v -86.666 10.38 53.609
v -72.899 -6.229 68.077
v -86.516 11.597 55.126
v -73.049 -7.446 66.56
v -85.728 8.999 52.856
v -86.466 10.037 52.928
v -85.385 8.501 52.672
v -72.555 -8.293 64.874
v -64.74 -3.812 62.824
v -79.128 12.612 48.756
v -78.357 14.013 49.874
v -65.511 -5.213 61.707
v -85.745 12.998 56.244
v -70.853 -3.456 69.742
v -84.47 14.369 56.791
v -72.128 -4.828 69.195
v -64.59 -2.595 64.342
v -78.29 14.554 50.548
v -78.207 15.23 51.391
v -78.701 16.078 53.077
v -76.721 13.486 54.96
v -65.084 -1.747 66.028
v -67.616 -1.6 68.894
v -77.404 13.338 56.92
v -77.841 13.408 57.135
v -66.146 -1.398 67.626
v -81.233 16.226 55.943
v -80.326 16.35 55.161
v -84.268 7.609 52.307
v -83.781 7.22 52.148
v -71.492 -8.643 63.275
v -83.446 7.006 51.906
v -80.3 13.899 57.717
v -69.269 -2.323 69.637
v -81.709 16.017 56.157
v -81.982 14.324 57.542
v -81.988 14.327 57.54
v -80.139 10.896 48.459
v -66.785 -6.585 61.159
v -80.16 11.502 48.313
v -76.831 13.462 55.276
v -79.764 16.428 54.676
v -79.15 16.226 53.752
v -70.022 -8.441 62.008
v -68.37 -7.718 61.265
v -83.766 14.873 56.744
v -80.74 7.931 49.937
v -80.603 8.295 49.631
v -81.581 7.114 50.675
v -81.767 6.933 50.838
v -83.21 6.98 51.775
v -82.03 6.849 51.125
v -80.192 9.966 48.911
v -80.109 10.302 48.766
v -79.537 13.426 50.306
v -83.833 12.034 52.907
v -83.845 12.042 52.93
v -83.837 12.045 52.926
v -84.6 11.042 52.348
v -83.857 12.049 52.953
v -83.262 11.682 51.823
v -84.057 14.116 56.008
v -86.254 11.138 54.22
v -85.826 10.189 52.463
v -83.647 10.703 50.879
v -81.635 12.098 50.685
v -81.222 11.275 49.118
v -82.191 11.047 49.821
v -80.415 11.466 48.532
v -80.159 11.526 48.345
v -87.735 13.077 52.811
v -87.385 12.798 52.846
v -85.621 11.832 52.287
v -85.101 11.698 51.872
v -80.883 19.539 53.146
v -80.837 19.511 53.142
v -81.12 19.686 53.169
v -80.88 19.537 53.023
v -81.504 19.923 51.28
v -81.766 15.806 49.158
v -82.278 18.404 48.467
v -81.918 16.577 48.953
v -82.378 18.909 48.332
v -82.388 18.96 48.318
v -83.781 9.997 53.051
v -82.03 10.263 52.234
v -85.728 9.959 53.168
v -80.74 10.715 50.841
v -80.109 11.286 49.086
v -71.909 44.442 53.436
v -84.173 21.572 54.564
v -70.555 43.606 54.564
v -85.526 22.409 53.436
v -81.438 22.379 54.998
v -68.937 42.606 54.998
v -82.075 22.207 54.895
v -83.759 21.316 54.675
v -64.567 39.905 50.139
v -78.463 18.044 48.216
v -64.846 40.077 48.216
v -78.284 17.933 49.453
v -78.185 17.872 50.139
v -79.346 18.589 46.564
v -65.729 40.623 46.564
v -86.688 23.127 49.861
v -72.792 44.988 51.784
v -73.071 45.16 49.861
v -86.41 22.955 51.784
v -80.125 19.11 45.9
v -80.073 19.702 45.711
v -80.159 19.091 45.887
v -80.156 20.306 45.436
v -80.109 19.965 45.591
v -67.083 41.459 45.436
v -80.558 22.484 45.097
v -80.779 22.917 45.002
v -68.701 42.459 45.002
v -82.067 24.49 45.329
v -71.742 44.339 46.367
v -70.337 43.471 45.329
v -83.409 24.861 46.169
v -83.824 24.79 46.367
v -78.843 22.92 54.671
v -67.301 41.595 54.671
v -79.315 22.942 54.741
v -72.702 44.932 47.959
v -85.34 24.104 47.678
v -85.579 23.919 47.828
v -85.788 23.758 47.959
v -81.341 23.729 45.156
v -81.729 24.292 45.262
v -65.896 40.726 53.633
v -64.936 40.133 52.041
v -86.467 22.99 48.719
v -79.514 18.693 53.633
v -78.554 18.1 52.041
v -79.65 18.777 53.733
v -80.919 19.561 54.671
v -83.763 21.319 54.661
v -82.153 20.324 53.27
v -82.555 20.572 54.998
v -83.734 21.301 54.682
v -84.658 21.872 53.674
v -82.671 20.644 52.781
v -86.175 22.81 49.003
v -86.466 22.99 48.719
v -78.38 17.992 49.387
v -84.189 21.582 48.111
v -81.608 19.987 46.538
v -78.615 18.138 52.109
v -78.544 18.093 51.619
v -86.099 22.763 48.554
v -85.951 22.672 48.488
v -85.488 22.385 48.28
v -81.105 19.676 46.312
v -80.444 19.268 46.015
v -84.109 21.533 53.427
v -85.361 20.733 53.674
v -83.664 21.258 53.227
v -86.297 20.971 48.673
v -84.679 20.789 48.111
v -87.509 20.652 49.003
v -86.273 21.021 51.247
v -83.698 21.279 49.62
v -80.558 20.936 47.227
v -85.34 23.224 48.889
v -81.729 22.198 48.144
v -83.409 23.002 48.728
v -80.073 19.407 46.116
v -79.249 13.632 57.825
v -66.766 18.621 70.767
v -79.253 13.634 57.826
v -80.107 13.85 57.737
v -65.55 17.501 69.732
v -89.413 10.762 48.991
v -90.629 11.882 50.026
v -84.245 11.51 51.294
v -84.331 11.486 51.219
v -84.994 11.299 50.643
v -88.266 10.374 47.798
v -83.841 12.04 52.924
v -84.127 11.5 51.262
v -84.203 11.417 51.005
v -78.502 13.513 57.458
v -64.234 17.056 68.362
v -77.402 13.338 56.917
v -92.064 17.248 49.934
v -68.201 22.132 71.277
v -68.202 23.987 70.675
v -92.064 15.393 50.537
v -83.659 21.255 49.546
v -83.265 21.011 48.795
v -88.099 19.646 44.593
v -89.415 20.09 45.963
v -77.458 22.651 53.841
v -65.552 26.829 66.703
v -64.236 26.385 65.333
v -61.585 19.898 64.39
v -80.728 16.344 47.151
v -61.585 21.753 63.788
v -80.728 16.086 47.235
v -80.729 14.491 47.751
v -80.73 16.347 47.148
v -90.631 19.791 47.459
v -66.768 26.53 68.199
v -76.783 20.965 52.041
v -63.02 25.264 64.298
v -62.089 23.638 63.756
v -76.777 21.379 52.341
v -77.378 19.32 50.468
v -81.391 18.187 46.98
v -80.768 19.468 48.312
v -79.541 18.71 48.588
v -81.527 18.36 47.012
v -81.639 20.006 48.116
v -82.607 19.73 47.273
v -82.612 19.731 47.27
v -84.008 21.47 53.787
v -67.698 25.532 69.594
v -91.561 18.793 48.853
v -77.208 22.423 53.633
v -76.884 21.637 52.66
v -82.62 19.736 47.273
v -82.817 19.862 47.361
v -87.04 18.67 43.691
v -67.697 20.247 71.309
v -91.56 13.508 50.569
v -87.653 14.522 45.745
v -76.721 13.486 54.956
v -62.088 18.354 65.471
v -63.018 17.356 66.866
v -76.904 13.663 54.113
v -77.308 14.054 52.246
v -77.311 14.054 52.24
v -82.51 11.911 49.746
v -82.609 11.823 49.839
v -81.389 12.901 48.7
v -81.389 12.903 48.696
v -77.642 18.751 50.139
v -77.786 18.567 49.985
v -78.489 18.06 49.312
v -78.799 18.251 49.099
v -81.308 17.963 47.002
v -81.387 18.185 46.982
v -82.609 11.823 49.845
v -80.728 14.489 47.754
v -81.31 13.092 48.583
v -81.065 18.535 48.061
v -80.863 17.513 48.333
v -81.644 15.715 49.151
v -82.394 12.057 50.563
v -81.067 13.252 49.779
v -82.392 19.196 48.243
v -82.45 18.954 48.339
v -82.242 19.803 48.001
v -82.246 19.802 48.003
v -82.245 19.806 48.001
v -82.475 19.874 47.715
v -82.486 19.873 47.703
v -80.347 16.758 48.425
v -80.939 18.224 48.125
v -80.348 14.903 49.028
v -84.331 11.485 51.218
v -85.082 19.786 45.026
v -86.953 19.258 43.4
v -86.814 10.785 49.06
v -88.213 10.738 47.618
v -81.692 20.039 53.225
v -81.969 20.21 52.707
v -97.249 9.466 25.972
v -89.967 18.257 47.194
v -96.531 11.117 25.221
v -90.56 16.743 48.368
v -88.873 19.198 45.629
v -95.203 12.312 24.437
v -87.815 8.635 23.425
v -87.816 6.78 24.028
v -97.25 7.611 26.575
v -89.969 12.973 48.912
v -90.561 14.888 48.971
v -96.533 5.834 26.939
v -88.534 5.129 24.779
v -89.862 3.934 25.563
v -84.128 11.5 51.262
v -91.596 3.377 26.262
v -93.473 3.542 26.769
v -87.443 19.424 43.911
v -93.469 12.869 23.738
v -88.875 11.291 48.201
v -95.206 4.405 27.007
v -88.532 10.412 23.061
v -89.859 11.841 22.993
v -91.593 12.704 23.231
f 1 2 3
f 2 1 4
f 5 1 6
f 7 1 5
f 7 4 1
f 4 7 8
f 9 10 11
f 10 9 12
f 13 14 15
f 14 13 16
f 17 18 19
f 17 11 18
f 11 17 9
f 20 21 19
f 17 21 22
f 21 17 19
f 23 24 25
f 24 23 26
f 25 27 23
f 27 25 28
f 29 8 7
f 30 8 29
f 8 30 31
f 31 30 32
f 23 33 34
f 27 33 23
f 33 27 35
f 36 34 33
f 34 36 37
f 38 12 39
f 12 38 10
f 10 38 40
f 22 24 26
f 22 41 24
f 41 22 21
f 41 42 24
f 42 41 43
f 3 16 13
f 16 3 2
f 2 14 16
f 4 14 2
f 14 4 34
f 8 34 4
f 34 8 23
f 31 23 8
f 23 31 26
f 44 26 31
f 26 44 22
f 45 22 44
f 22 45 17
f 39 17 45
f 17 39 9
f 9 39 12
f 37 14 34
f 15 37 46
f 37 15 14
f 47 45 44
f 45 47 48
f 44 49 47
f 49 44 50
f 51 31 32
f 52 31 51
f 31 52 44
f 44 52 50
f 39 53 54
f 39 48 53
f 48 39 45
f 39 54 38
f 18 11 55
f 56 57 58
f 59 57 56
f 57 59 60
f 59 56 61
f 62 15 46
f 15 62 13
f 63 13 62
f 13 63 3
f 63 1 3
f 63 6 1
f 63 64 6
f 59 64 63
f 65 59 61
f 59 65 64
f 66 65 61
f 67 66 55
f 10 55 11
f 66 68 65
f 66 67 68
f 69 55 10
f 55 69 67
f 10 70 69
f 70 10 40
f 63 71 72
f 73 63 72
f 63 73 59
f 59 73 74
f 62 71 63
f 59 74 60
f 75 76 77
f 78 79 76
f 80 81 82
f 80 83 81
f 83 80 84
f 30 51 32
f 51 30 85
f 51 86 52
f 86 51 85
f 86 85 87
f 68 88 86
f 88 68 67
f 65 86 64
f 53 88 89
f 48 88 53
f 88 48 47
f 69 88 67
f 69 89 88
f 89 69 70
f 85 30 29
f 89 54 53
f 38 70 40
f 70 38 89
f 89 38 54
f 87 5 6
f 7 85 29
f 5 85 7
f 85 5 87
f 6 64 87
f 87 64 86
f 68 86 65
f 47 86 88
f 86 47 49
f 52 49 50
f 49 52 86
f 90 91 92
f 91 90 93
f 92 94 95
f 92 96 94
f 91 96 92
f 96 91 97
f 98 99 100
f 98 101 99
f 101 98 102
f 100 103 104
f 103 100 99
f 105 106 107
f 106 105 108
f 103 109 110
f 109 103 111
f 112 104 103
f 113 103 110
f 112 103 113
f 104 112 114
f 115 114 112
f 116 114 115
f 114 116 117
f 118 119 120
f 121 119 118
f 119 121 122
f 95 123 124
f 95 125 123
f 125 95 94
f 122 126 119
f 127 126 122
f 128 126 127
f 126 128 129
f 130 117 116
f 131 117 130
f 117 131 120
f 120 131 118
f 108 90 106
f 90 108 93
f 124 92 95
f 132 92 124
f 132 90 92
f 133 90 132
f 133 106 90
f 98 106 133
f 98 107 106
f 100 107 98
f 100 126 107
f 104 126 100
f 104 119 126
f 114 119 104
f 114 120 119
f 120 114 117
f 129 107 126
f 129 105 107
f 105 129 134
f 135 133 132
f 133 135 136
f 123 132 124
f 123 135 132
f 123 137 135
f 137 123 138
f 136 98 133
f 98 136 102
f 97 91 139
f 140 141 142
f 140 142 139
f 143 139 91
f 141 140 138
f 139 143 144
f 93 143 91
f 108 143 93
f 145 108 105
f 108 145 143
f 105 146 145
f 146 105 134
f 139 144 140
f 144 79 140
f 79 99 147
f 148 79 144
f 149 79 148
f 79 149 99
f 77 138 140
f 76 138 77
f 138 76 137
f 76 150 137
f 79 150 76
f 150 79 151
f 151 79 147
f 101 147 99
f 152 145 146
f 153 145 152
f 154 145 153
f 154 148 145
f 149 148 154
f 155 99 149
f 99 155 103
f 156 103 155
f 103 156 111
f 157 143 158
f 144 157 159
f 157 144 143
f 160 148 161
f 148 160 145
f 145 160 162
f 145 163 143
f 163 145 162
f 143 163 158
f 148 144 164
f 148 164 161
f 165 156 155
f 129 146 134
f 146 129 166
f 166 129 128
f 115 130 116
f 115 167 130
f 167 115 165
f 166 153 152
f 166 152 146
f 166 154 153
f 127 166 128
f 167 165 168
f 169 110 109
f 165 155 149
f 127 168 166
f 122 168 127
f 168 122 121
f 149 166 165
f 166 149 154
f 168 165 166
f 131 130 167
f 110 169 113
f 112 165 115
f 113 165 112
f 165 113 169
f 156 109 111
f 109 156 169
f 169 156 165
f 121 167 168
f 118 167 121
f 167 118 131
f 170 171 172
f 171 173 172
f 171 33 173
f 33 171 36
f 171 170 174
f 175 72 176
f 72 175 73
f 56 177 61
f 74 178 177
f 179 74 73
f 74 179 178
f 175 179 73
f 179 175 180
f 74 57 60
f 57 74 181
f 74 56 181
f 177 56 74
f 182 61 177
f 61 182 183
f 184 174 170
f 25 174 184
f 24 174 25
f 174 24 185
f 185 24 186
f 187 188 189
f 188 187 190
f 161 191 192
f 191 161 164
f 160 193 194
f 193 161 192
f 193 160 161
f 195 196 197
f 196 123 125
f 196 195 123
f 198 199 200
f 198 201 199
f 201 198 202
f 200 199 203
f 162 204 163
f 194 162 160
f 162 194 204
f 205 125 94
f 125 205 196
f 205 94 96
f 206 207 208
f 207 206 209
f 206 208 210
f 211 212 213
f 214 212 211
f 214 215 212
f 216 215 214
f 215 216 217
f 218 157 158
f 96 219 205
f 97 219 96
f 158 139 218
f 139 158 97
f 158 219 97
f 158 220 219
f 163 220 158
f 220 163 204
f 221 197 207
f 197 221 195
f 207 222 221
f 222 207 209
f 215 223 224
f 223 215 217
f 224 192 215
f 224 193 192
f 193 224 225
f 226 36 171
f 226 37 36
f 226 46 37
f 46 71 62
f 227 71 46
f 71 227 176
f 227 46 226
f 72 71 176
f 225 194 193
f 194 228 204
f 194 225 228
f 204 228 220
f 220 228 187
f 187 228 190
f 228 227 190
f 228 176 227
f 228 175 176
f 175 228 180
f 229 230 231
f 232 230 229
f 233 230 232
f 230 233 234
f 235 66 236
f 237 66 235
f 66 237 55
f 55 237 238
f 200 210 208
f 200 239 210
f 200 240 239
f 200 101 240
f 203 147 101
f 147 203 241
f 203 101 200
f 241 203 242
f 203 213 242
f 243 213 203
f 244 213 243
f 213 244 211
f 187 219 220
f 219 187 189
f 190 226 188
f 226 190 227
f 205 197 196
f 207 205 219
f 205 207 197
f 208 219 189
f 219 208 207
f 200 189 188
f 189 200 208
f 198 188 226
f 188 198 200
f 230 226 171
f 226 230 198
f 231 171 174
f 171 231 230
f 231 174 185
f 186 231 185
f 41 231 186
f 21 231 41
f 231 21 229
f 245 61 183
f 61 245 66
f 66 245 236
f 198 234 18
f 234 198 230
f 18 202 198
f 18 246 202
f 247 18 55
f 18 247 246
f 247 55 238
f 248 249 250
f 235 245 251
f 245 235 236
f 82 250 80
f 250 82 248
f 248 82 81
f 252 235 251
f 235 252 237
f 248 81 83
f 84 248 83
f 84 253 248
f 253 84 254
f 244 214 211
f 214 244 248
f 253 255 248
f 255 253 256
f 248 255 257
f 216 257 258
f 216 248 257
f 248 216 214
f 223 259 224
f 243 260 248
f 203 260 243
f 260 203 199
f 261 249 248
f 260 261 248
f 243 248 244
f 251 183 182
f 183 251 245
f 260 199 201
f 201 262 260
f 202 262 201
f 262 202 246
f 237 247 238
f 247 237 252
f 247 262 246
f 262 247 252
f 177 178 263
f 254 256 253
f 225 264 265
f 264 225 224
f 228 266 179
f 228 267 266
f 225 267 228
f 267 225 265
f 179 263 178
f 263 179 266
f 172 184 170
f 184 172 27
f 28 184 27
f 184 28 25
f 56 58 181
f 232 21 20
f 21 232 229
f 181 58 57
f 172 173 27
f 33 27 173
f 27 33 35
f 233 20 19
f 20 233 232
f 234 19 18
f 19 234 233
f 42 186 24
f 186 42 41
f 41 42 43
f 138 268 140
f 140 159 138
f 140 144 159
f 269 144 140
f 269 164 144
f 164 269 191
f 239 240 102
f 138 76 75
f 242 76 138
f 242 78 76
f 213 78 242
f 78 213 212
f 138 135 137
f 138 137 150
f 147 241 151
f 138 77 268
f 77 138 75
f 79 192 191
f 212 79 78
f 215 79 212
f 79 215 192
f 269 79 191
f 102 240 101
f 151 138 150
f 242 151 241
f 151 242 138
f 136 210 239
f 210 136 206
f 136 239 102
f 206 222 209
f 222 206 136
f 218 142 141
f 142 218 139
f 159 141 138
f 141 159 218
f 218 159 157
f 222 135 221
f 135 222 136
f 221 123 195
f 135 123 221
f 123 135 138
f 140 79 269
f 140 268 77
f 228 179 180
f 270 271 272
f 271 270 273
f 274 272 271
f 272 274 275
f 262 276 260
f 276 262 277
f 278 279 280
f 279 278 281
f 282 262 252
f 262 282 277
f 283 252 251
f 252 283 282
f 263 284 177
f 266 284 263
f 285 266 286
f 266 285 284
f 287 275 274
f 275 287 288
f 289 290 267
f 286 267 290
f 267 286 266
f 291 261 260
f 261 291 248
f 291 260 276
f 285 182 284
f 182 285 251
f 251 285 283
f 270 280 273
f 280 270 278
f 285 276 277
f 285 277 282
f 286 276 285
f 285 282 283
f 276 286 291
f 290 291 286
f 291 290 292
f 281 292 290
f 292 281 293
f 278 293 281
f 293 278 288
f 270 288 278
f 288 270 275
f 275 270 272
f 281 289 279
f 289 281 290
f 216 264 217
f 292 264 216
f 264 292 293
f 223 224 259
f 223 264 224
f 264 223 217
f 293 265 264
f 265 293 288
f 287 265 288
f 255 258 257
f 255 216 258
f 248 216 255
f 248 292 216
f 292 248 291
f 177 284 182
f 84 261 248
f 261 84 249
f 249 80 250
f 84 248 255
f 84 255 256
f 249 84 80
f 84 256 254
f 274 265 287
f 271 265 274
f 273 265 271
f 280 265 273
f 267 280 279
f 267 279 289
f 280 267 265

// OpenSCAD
// file: local.scad
/*
Copyright (c) 2013 Johannes Reinhardt <jreinhardt@ist-dein-freund.de>

Permission is hereby granted, free of charge, to any person obtaining a copy
of this software and associated documentation files (the "Software"), to deal
in the Software without restriction, including without limitation the rights
to use, copy, modify, merge, publish, distribute, sublicense, and/or sell
copies of the Software, and to permit persons to whom the Software is
furnished to do so, subject to the following conditions:

The above copyright notice and this permission notice shall be included in
all copies or substantial portions of the Software.

THE SOFTWARE IS PROVIDED "AS IS", WITHOUT WARRANTY OF ANY KIND, EXPRESS OR
IMPLIED, INCLUDING BUT NOT LIMITED TO THE WARRANTIES OF MERCHANTABILITY,
FITNESS FOR A PARTICULAR PURPOSE AND NONINFRINGEMENT. IN NO EVENT SHALL THE
AUTHORS OR COPYRIGHT HOLDERS BE LIABLE FOR ANY CLAIM, DAMAGES OR OTHER
LIABILITY, WHETHER IN AN ACTION OF CONTRACT, TORT OR OTHERWISE, ARISING FROM,
OUT OF OR IN CONNECTION WITH THE SOFTWARE OR THE USE OR OTHER DEALINGS IN
THE SOFTWARE.
*/

/*
local.scad local coordinate systems for OpenSCAD

for more information, see https://github.com/jreinhardt/local-scad
*/

//a few utility functions
function norm(a) = sqrt(a*a);
function unit_vector(v) = v/norm(v);
function clamp(v,lower_bound,upper_bound) = min(max(v,lower_bound),upper_bound);
function cross_product(a,b) = [
	a[1]*b[2]-a[2]*b[1],
	a[2]*b[0]-a[0]*b[2],
	a[0]*b[1]-a[1]*b[0]
];

//works for both numbers and vectors
function almost_equal(number, ref, tol) = sqrt((number-ref)*(number-ref)) < tol;

function _rotation_angle(a,b) = (a*b > 0) ? 
	asin(clamp(norm(cross_product(b,a))/norm(a)/norm(b),-1,1)) :
	180 - asin(clamp(norm(cross_product(b,a))/norm(a)/norm(b),-1,1));

//The (non-unit) rotation axis and angle around which a has to be rotated to be colinear to b
function calculate_rotation_axis(a,b) =
	//if the two vectors are not colinear find a rotation axis using the cross product
	(norm(cross_product(b,a)) != 0) ? [unit_vector(cross_product(b,a)),_rotation_angle(a,b)] :
	//if they are colinear and do not lie in the yz plane, choose the rotation axis from the yz plane
	(a*[1,0,0] < 0) ? [unit_vector([0,-a[1],+a[0]]),acos(clamp(a*b/norm(a)/norm(b),-1,1))] :
	(a*[1,0,0] > 0) ? [unit_vector([0,+a[1],-a[0]]),acos(clamp(a*b/norm(a)/norm(b),-1,1))] :
	//otherwise use the x axis
	[[1,0,0],acos(clamp(a*b/norm(a)/norm(b),-1,1))];

function calculate_axes(x,y) = [unit_vector(x),unit_vector(y), unit_vector(cross_product(x,y))];

function new_cs(origin=[0,0,0],axes=[[1,0,0],[0,1,0],[0,0,1]]) = (len(axes) == 2) ?
	[origin,calculate_axes(axes[0],axes[1])] :
	is_orthonormal([origin,axes]) ?
		[origin,axes] :
		"Error: Axes are not orthonormal";

function is_orthonormal(cs,tol=1e-3) =
	(almost_equal(norm(cs[1][0]),1,tol)) &&
	(almost_equal(norm(cs[1][1]),1,tol)) &&
	(almost_equal(norm(cs[1][2]),1,tol)) &&
	(almost_equal(cross_product(cs[1][0],cs[1][1]),cs[1][2],tol)) &&
	(almost_equal(cross_product(cs[1][1],cs[1][2]),cs[1][0],tol)) &&
	(almost_equal(cross_product(cs[1][2],cs[1][0]),cs[1][1],tol));

function unit_matrix3() = [
[1,0,0],
[0,1,0],
[0,0,1]];

function tensor_product_matrix3(u,v) = [
[u[0]*v[0], u[0]*v[1], u[0]*v[2]],
[u[1]*v[0], u[1]*v[1], u[1]*v[2]],
[u[2]*v[0], u[2]*v[1], u[2]*v[2]]];

function cross_product_matrix3(v) = [
[   0 , -v[2], +v[1]],
[+v[2],    0 , -v[0]],
[-v[1],  v[0],    0 ]];

function rotation_matrix3(n,angle) =
	cos(angle)*unit_matrix3() +
	sin(angle)*cross_product_matrix3(n) +
	(1-cos(angle))*tensor_product_matrix3(n,n);

//the modules are used directly by the user
module show_cs(cs){
	origin = cs[0];
	axes = cs[1];
	x_rot = calculate_rotation_axis(axes[0],[0,0,1]);
	y_rot = calculate_rotation_axis(axes[1],[0,0,1]);
	z_rot = calculate_rotation_axis(axes[2],[0,0,1]);
	translate(origin){
		color("Gray") sphere(0.2);
		rotate(x_rot[1],x_rot[0]) color("Red") cylinder(r=0.1,h=100*norm(axes[0]));
		rotate(y_rot[1],y_rot[0]) color("Green") cylinder(r=0.1,h=100*norm(axes[1]));
		rotate(z_rot[1],z_rot[0]) color("Blue") cylinder(r=0.1,h=100*norm(axes[2]));
	}
}

module translate_local(cs,v=[0,0,0]){
	origin = cs[0];
	axes = cs[1];
	x_rot = calculate_rotation_axis(axes[0],[1,0,0]);
	y_rot = calculate_rotation_axis(axes[1],
		rotation_matrix3(x_rot[0],x_rot[1])*[0,1,0]);
	translate(origin+v*axes){
		//align y axes
		rotate(y_rot[1],y_rot[0]){
			//align x axes
			rotate(x_rot[1],x_rot[0]){
				child(0);
			}
		}
	}
}

module in_cs(cs){
	origin = cs[0];
	axes = cs[1];
	x_rot = calculate_rotation_axis(axes[0],[1,0,0]);
	y_rot = calculate_rotation_axis(axes[1],
		rotation_matrix3(x_rot[0],x_rot[1])*[0,1,0]);
	translate(origin){
		//align y axes
		rotate(y_rot[1],y_rot[0]){
			//align x axes
			rotate(x_rot[1],x_rot[0]){
				child(0);
			}
		}
	}
}

module back_to_absolute(cs){
	origin = cs[0];
	axes = cs[1];
	x_rot = calculate_rotation_axis(axes[0],[1,0,0]);
	y_rot = calculate_rotation_axis(axes[1],
		rotation_matrix3(x_rot[0],x_rot[1])*[0,1,0]);
       

		//align y axes
             rotate(x_rot[1], -x_rot[0]){
             rotate(y_rot[1],-y_rot[0]){
                  //align x axes
                  	translate(-origin){
				child(0);
			}
		}
	}
}

module align(cs, cs_dst, displacement=[0,0,0]){
	x_rot = calculate_rotation_axis(cs[1][0],cs_dst[1][0]);
	y_rot = _rotation_angle(cs[1][1],
		rotation_matrix3(x_rot[0],x_rot[1])*cs_dst[1][1]);
	translate(cs_dst[0]+displacement*cs_dst[1])
		//align x axes
		rotate(-x_rot[1],x_rot[0])
				//align y axes
				rotate(-y_rot,cs[1][0])
				translate(-cs[0])
					child(0);
}
// file: data.scad
points2 = [
     [44.721359, -27.639320, 85.065079],
     [-44.721359, 27.639320, 85.065079],
     [-44.721359, 27.639320, -85.065079],
     [44.721359, -27.639320, -85.065079],
     [-44.721359, -72.360680, 52.573109],
     [44.721359, 72.360680, 52.573109],
     [44.721359, 72.360680, -52.573109],
     [-44.721359, -72.360680, -52.573109],
     [44.721359, -89.442719, 0.000000],
     [100.000000, 0.000000, 0.000000],
     [-44.721359, 89.442719, 0.000000],
     [-100.000000, 0.000000, 0.000000],
     [0.000000, -95.105652, -30.901697],
     [0.000000, -95.105652, 30.901697],
     [-52.573109, -85.065086, 0.000000],
     [0.000000, -58.778526, -80.901695],
     [52.573109, -68.819092, -49.999996],
     [52.573109, -68.819092, 49.999996],
     [0.000000, -58.778526, 80.901695],
     [85.065086, -52.573109, 0.000000],
     [85.065086, -16.245981, 49.999996],
     [85.065086, -16.245985, -49.999996],
     [85.065086, 42.532543, 30.901697],
     [52.573109, 26.286554, 80.901695],
     [85.065086, 42.532543, -30.901697],
     [52.573109, 85.065086, 0.000000],
     [52.573109, 26.286558, -80.901695],
     [0.000000, 0.000000, -99.999992],
     [-52.573109, -26.286554, -80.901695],
     [0.000000, 58.778526, -80.901695],
     [0.000000, 0.000000, 99.999992],
     [-52.573109, -26.286558, 80.901695],
     [0.000000, 58.778526, 80.901695],
     [-85.065086, -42.532543, 30.901697],
     [-85.065086, -42.532543, -30.901697],
     [-85.065086, 16.245983, -49.999996],
     [-85.065086, 52.573109, 0.000000],
     [-52.573109, 68.819099, -49.999996],
     [-85.065086, 16.245985, 49.999996],
     [-52.573116, 68.819092, 49.999996],
     [0.000000, 95.105652, -30.901697],
     [0.000000, 95.105652, 30.901697]];

triangles2 = [
          [34, 11, 33],
          [35, 11, 34],
          [36, 11, 35] ,
          [36, 38, 11],
         [33, 11, 38],
          [14, 33, 4],
          [14, 34, 33],
          [7, 34, 14],
          [28, 34, 7],
          [28, 35, 34],
          [2, 35, 28],
          [37, 35, 2],
          [37, 36, 35],
          [10, 36, 37],
          [39, 1, 38],
          [36, 39, 38], 
          [10, 39, 36],
          [31, 38, 1],
          [31, 33, 38],
          [4, 33, 31],
          [14, 12, 7],
          [14, 13, 12],
          [4, 13, 14],
          [15, 7, 12],
          [18, 13, 4],
          [28, 27, 2],
          [28, 15, 27],
          [7, 15, 28],
          [2, 27, 29],
          [31, 18, 4],
          [31, 30, 18],
          [1, 30, 31],
          [32, 30, 1],
          [41, 10, 40],
          [39, 10, 41],
          [32, 39, 41],
          [1, 39, 32],
          [40, 10, 37],
          [29, 37, 2],
          [29, 40, 37]

          ];

     beams2 = [
          [34, 11],
          [34, 33],
          [11, 33],
         [35, 11],
          [35, 34],
          [36, 11],
          [36, 35],
          [36, 38],
          [38, 11],
          [33, 38],
         [14, 33],
          [14, 4],
          [33, 4],
          [14, 34],
          [7, 34],
          [7, 14],
          [28, 34],
          [28, 7],
          [28, 35],
          [2, 35],
          [2, 28],
          [37, 35],
          [37, 2],
          [37, 36],
          [10, 36],
          [10, 37],
          [39, 1],
          [39, 38],
          [1, 38],
          [36, 39],
          [10, 39],
          [31, 38],
          [31, 1],
          [31, 33],
          [4, 31],
          [14, 12],
          [12, 7],
          [14, 13],
          [13, 12],
          [4, 13],
          [15, 7],
          [15, 12],
          [18, 13],
          [18, 4],
          [28, 27],
          [27, 2],
          [28, 15],
          [15, 27],
          [2, 29],
          [27, 29],
          [31, 18],
          [31, 30],
          [30, 18],
          [1, 30],
          [32, 30],
          [32, 1],
          [41, 10],
          [41, 40],
          [10, 40],
          [39, 41],
          [32, 39],
          [32, 41],
          [40, 37],
          [29, 37],
          [29, 40] 
          ];
// main file
include <data.scad>
include <local.scad>

ScaleFactor=0.5;
BeamDiameter=10;
BeamLip=5;


PrepareForSTL=false;
// old beam stuff, needed for the wireframe

module element(length, diameter, c) {
     color(c) {
          translate([0, 0, length/2]) {
               cylinder(length, diameter/2, diameter/2, length, center=true);
          }
     }
}

module wire(p1, p2, diameter, color) {
     axle = p2-p1;
     length = norm(axle); 
       
     b = acos(axle[2]/length); // inclination angle
     c = atan2(axle[1], axle[0]);     // azimuthal angle

     translate(p1) {
          rotate([0, b, c]) {
               element(length, diameter, color);
          }
     }
}

module create_wire(points, triangles) {
     for(triangle=triangles) {
          p1 = points[triangle[0]]; 
          p2 = points[triangle[1]]; 
          p3 = points[triangle[2]];
          wire(p1, p2, 1);
          wire(p2, p3, 1);
          wire(p3, p1, 1);
     }
}



module beam(p1, p2, p3, color, showAxes) {
     ref_38_31 = new_cs(origin=p1,axes=[(p2-p1), cross((p2-p1), (p3-p1))]);
     if (showAxes)
          show_cs(ref_38_31);
     in_cs(ref_38_31) {
          color(color) {
               difference() {
                    translate([-BeamLip, 0, 0]) {
                         rotate([0, 90, 0]){
                              cylinder(ScaleFactor * norm((p2-p1)) + BeamLip, BeamDiameter/2, BeamDiameter/2);
                         }
                    }
                    children(0);
               };
               children(1) ;
          }
     }
}

// helpers to change coordinate systems

module prepare_for_stl(p1, p2, p3) {
     if (PrepareForSTL) {
          ref_38_31 = new_cs(origin=p1,axes=[(p2-p1), cross((p2-p1), (p3-p1))]);
          back_to_absolute(ref_38_31) {
               children(); 
          }
     } else {
          children();
     }
}
 
module in_beam_referential(p1, p2, p3, color) {
     ref_38_31 = new_cs(origin=p1,axes=[(p2-p1), cross((p2-p1), (p3-p1))]);
     in_cs(ref_38_31) {
          color(color) {
               children();
          }
     }
}

// little helper

module head_in_beam_referential(p1, p2, p3) {
     in_beam_referential(p1, p2, p3) {
          translate([BeamDiameter/2, 0, 0]) {
               rotate([0, 90, 0]){
                    cylinder(BeamDiameter, BeamDiameter/2, BeamDiameter/2);
               }
          }
     }
}

/*

  p6  p5  p7
  p1  
  p4  p2  p3

*/

p1 = points2[38]; 
p2 = points2[1]; 
p3 = points2[39]; 
p4 = points2[31]; 
p5 = points2[11]; 
p6 = points2[33];
p7 = points2[36];

// let's print the joint beams
module red_mortaise() {
     translate([BeamDiameter/4, BeamDiameter/4, 0]) {
          cube([BeamDiameter/2, BeamDiameter/4, BeamDiameter/2], center=true);
     };
}

module green_mortaise() {
     translate([BeamDiameter/4, BeamDiameter/4, 0]) {
          cube([BeamDiameter/2, BeamDiameter/4, BeamDiameter/2], center=true);
     }
}

module blue_mortaise() {
     translate([0, 0, BeamDiameter/4]) {
          cube([BeamDiameter, BeamDiameter/3, BeamDiameter/3], center=true);
     }
}

module pink_mortaise() {
     translate([0, BeamDiameter/8, BeamDiameter/4]) {
          cube([BeamDiameter, BeamDiameter/3, BeamDiameter/3], center=true);
     }
}



module orange_mortaise() {
     translate([BeamDiameter/2, -BeamDiameter/4, 0]) {
          cube([BeamDiameter*2, BeamDiameter/6, BeamDiameter/2], center=true);
     }
}

module green_beam() {
     difference() {
          beam(p1, p4, p2, "green", showAxes=false) {
               translate([-BeamDiameter/2, 0, 0]) {
                    cube([BeamDiameter*2, BeamDiameter, BeamDiameter], center=true);
               };
               green_mortaise();
          };

          /*  difference() {
              head_in_beam_referential(p1,p2,p3);
              green_mortaise();
              }*/
          
          // head_in_beam_referential(p1, p3, p7) ;
       
          // the red pins
          in_beam_referential(p1, p3, p7) {
               red_mortaise();
              
          }

          in_beam_referential(p1, p5, p6) {
               orange_mortaise();
          }

          

          head_in_beam_referential(p1, p6, p4);
          head_in_beam_referential(p1, p5, p6);
     } 
}

module black_lip_mask(extra) {
     in_beam_referential(p1, p2, p3) {
          translate([BeamDiameter/2, BeamDiameter/2 - BeamDiameter/6, 0]) {
               cube([2*BeamDiameter, BeamDiameter, 2*BeamDiameter], center=true);
          }
     }
}

module black_beam() {
     
     difference() {
          beam(p1, p2, p3, "black") {
               translate([-BeamDiameter/1, 0, 0]) {
                    cube([BeamDiameter, BeamDiameter, BeamDiameter], center=true);
               };
          };
          
          /* in_beam_referential(p1, p4, p2) {
             green_mortaise();
             }
          
             in_beam_referential(p1, p3, p7) {
             red_mortaise();
             }
          
             in_beam_referential(p1, p6, p4) {
             pink_mortaise();
             }

             in_beam_referential(p1, p3, p7) {
             blue_mortaise();
             }*/

          
          head_in_beam_referential(p1, p4, p2);
          head_in_beam_referential(p1, p3, p7);

          // the head of the orange is a bit more compelx

          in_beam_referential(p1, p5, p6) {
               orange_mortaise();
          }
             
          // this is the splitter
          in_beam_referential(p1, p2, p3) {
               translate([-BeamDiameter/2,-BeamDiameter/2 - BeamDiameter/6, 0]) {
                    cube([BeamDiameter, BeamDiameter, 2*BeamDiameter], center=true);
               }
          }

          
          difference() {
               in_beam_referential(p1, p5, p6) {
                    translate([0, 0, 0]) {
                         rotate([0, 90, 0]){
                              cylinder(BeamDiameter, BeamDiameter/2, BeamDiameter/2);
                         }
                    }
               }

               black_lip_mask(0);
               
          }

          /*  head_in_beam_referential(p1, p3, p7);
              head_in_beam_referential(p1, p6, p4);
              head_in_beam_referential(p1, p7, p5); */
 
          
        
     }
     
}

module red_beam() {
     difference() {
          beam(p1, p3, p7, "red") {
               // this one has a pin on the inside, slighly torn inside 
               
               difference(){
                    translate([-BeamDiameter/2, 0, 0]) {
                         cube([BeamDiameter*2, BeamDiameter, BeamDiameter], center=true);
                    };
               }
               red_mortaise();
               
               
          };
          /*in_beam_referential(p1, p5, p6) {
            blue_mortaise();
            } */
          head_in_beam_referential(p1, p7, p5);
          head_in_beam_referential(p1, p5, p6);

     }
}

module blue_beam() {
     beam(p1, p7, p5, "blue") {
          // this one has a pin on the inside, slighly torn inside 
          /*  translate([-BeamDiameter/2, 0, 0]) {
              cube([BeamDiameter*2, BeamDiameter, BeamDiameter], center=true);
              };
          */
          // adding the mortaise
          translate([-BeamDiameter/2, 0, 0]) {
               cube([BeamDiameter, BeamDiameter, BeamDiameter], center=true);
          };
          
          blue_mortaise();
          
     };
}

module pink_beam() {
     beam(p1, p6, p4, "pink") {
          // this one has a pin on the inside, slighly torn inside 
          /*  translate([-BeamDiameter/2, 0, 0]) {
              cube([BeamDiameter*2, BeamDiameter, BeamDiameter], center=true);
              };
          */
          // adding the mortaise
          translate([-BeamDiameter/2, 0, 0]) {
               cube([BeamDiameter, BeamDiameter, BeamDiameter], center=true);
          };
          
          pink_mortaise();
          in_beam_referential(p1, p4, p2) {
               green_mortaise();
          };

       
     };
}


module orange_beam() {
     difference() {
          beam(p1, p5, p6, "orange") {
               translate([-BeamDiameter/2, 0, 0]) {
                    cube([BeamDiameter, BeamDiameter, BeamDiameter], center=true);
               };
              
          };
          
          
          
          // these are the mortaises from the two lower
          // side beams. 
          in_beam_referential(p1, p3, p7) {
               red_mortaise();
          };
          black_lip_mask();
     }
     in_beam_referential(p1, p5, p6) {
          
          orange_mortaise();
     }
}


/*
  green_beam();
  black_beam();
  red_beam();

  create_wire(points2, triangles2); 
*/


// stuff needed to 3d print the model - it is much easier if they are back in a normal referential

//create_wire(points2, triangles2); 


prepare_for_stl(p1, p4, p2) {
     green_beam();
}

prepare_for_stl(p1, p3, p7) {
     red_beam();
}
/*
  prepare_for_stl(p1, p3, p7) {
  blue_beam();
  }
*/


prepare_for_stl(p1, p2, p3) {
     black_beam();
}

/*
  prepare_for_stl(p1, p6, p4) {
  pink_beam();
  } */


translate([0, 0, 0]) {
     prepare_for_stl(p1, p5, p6) {
          orange_beam();
     }
}
